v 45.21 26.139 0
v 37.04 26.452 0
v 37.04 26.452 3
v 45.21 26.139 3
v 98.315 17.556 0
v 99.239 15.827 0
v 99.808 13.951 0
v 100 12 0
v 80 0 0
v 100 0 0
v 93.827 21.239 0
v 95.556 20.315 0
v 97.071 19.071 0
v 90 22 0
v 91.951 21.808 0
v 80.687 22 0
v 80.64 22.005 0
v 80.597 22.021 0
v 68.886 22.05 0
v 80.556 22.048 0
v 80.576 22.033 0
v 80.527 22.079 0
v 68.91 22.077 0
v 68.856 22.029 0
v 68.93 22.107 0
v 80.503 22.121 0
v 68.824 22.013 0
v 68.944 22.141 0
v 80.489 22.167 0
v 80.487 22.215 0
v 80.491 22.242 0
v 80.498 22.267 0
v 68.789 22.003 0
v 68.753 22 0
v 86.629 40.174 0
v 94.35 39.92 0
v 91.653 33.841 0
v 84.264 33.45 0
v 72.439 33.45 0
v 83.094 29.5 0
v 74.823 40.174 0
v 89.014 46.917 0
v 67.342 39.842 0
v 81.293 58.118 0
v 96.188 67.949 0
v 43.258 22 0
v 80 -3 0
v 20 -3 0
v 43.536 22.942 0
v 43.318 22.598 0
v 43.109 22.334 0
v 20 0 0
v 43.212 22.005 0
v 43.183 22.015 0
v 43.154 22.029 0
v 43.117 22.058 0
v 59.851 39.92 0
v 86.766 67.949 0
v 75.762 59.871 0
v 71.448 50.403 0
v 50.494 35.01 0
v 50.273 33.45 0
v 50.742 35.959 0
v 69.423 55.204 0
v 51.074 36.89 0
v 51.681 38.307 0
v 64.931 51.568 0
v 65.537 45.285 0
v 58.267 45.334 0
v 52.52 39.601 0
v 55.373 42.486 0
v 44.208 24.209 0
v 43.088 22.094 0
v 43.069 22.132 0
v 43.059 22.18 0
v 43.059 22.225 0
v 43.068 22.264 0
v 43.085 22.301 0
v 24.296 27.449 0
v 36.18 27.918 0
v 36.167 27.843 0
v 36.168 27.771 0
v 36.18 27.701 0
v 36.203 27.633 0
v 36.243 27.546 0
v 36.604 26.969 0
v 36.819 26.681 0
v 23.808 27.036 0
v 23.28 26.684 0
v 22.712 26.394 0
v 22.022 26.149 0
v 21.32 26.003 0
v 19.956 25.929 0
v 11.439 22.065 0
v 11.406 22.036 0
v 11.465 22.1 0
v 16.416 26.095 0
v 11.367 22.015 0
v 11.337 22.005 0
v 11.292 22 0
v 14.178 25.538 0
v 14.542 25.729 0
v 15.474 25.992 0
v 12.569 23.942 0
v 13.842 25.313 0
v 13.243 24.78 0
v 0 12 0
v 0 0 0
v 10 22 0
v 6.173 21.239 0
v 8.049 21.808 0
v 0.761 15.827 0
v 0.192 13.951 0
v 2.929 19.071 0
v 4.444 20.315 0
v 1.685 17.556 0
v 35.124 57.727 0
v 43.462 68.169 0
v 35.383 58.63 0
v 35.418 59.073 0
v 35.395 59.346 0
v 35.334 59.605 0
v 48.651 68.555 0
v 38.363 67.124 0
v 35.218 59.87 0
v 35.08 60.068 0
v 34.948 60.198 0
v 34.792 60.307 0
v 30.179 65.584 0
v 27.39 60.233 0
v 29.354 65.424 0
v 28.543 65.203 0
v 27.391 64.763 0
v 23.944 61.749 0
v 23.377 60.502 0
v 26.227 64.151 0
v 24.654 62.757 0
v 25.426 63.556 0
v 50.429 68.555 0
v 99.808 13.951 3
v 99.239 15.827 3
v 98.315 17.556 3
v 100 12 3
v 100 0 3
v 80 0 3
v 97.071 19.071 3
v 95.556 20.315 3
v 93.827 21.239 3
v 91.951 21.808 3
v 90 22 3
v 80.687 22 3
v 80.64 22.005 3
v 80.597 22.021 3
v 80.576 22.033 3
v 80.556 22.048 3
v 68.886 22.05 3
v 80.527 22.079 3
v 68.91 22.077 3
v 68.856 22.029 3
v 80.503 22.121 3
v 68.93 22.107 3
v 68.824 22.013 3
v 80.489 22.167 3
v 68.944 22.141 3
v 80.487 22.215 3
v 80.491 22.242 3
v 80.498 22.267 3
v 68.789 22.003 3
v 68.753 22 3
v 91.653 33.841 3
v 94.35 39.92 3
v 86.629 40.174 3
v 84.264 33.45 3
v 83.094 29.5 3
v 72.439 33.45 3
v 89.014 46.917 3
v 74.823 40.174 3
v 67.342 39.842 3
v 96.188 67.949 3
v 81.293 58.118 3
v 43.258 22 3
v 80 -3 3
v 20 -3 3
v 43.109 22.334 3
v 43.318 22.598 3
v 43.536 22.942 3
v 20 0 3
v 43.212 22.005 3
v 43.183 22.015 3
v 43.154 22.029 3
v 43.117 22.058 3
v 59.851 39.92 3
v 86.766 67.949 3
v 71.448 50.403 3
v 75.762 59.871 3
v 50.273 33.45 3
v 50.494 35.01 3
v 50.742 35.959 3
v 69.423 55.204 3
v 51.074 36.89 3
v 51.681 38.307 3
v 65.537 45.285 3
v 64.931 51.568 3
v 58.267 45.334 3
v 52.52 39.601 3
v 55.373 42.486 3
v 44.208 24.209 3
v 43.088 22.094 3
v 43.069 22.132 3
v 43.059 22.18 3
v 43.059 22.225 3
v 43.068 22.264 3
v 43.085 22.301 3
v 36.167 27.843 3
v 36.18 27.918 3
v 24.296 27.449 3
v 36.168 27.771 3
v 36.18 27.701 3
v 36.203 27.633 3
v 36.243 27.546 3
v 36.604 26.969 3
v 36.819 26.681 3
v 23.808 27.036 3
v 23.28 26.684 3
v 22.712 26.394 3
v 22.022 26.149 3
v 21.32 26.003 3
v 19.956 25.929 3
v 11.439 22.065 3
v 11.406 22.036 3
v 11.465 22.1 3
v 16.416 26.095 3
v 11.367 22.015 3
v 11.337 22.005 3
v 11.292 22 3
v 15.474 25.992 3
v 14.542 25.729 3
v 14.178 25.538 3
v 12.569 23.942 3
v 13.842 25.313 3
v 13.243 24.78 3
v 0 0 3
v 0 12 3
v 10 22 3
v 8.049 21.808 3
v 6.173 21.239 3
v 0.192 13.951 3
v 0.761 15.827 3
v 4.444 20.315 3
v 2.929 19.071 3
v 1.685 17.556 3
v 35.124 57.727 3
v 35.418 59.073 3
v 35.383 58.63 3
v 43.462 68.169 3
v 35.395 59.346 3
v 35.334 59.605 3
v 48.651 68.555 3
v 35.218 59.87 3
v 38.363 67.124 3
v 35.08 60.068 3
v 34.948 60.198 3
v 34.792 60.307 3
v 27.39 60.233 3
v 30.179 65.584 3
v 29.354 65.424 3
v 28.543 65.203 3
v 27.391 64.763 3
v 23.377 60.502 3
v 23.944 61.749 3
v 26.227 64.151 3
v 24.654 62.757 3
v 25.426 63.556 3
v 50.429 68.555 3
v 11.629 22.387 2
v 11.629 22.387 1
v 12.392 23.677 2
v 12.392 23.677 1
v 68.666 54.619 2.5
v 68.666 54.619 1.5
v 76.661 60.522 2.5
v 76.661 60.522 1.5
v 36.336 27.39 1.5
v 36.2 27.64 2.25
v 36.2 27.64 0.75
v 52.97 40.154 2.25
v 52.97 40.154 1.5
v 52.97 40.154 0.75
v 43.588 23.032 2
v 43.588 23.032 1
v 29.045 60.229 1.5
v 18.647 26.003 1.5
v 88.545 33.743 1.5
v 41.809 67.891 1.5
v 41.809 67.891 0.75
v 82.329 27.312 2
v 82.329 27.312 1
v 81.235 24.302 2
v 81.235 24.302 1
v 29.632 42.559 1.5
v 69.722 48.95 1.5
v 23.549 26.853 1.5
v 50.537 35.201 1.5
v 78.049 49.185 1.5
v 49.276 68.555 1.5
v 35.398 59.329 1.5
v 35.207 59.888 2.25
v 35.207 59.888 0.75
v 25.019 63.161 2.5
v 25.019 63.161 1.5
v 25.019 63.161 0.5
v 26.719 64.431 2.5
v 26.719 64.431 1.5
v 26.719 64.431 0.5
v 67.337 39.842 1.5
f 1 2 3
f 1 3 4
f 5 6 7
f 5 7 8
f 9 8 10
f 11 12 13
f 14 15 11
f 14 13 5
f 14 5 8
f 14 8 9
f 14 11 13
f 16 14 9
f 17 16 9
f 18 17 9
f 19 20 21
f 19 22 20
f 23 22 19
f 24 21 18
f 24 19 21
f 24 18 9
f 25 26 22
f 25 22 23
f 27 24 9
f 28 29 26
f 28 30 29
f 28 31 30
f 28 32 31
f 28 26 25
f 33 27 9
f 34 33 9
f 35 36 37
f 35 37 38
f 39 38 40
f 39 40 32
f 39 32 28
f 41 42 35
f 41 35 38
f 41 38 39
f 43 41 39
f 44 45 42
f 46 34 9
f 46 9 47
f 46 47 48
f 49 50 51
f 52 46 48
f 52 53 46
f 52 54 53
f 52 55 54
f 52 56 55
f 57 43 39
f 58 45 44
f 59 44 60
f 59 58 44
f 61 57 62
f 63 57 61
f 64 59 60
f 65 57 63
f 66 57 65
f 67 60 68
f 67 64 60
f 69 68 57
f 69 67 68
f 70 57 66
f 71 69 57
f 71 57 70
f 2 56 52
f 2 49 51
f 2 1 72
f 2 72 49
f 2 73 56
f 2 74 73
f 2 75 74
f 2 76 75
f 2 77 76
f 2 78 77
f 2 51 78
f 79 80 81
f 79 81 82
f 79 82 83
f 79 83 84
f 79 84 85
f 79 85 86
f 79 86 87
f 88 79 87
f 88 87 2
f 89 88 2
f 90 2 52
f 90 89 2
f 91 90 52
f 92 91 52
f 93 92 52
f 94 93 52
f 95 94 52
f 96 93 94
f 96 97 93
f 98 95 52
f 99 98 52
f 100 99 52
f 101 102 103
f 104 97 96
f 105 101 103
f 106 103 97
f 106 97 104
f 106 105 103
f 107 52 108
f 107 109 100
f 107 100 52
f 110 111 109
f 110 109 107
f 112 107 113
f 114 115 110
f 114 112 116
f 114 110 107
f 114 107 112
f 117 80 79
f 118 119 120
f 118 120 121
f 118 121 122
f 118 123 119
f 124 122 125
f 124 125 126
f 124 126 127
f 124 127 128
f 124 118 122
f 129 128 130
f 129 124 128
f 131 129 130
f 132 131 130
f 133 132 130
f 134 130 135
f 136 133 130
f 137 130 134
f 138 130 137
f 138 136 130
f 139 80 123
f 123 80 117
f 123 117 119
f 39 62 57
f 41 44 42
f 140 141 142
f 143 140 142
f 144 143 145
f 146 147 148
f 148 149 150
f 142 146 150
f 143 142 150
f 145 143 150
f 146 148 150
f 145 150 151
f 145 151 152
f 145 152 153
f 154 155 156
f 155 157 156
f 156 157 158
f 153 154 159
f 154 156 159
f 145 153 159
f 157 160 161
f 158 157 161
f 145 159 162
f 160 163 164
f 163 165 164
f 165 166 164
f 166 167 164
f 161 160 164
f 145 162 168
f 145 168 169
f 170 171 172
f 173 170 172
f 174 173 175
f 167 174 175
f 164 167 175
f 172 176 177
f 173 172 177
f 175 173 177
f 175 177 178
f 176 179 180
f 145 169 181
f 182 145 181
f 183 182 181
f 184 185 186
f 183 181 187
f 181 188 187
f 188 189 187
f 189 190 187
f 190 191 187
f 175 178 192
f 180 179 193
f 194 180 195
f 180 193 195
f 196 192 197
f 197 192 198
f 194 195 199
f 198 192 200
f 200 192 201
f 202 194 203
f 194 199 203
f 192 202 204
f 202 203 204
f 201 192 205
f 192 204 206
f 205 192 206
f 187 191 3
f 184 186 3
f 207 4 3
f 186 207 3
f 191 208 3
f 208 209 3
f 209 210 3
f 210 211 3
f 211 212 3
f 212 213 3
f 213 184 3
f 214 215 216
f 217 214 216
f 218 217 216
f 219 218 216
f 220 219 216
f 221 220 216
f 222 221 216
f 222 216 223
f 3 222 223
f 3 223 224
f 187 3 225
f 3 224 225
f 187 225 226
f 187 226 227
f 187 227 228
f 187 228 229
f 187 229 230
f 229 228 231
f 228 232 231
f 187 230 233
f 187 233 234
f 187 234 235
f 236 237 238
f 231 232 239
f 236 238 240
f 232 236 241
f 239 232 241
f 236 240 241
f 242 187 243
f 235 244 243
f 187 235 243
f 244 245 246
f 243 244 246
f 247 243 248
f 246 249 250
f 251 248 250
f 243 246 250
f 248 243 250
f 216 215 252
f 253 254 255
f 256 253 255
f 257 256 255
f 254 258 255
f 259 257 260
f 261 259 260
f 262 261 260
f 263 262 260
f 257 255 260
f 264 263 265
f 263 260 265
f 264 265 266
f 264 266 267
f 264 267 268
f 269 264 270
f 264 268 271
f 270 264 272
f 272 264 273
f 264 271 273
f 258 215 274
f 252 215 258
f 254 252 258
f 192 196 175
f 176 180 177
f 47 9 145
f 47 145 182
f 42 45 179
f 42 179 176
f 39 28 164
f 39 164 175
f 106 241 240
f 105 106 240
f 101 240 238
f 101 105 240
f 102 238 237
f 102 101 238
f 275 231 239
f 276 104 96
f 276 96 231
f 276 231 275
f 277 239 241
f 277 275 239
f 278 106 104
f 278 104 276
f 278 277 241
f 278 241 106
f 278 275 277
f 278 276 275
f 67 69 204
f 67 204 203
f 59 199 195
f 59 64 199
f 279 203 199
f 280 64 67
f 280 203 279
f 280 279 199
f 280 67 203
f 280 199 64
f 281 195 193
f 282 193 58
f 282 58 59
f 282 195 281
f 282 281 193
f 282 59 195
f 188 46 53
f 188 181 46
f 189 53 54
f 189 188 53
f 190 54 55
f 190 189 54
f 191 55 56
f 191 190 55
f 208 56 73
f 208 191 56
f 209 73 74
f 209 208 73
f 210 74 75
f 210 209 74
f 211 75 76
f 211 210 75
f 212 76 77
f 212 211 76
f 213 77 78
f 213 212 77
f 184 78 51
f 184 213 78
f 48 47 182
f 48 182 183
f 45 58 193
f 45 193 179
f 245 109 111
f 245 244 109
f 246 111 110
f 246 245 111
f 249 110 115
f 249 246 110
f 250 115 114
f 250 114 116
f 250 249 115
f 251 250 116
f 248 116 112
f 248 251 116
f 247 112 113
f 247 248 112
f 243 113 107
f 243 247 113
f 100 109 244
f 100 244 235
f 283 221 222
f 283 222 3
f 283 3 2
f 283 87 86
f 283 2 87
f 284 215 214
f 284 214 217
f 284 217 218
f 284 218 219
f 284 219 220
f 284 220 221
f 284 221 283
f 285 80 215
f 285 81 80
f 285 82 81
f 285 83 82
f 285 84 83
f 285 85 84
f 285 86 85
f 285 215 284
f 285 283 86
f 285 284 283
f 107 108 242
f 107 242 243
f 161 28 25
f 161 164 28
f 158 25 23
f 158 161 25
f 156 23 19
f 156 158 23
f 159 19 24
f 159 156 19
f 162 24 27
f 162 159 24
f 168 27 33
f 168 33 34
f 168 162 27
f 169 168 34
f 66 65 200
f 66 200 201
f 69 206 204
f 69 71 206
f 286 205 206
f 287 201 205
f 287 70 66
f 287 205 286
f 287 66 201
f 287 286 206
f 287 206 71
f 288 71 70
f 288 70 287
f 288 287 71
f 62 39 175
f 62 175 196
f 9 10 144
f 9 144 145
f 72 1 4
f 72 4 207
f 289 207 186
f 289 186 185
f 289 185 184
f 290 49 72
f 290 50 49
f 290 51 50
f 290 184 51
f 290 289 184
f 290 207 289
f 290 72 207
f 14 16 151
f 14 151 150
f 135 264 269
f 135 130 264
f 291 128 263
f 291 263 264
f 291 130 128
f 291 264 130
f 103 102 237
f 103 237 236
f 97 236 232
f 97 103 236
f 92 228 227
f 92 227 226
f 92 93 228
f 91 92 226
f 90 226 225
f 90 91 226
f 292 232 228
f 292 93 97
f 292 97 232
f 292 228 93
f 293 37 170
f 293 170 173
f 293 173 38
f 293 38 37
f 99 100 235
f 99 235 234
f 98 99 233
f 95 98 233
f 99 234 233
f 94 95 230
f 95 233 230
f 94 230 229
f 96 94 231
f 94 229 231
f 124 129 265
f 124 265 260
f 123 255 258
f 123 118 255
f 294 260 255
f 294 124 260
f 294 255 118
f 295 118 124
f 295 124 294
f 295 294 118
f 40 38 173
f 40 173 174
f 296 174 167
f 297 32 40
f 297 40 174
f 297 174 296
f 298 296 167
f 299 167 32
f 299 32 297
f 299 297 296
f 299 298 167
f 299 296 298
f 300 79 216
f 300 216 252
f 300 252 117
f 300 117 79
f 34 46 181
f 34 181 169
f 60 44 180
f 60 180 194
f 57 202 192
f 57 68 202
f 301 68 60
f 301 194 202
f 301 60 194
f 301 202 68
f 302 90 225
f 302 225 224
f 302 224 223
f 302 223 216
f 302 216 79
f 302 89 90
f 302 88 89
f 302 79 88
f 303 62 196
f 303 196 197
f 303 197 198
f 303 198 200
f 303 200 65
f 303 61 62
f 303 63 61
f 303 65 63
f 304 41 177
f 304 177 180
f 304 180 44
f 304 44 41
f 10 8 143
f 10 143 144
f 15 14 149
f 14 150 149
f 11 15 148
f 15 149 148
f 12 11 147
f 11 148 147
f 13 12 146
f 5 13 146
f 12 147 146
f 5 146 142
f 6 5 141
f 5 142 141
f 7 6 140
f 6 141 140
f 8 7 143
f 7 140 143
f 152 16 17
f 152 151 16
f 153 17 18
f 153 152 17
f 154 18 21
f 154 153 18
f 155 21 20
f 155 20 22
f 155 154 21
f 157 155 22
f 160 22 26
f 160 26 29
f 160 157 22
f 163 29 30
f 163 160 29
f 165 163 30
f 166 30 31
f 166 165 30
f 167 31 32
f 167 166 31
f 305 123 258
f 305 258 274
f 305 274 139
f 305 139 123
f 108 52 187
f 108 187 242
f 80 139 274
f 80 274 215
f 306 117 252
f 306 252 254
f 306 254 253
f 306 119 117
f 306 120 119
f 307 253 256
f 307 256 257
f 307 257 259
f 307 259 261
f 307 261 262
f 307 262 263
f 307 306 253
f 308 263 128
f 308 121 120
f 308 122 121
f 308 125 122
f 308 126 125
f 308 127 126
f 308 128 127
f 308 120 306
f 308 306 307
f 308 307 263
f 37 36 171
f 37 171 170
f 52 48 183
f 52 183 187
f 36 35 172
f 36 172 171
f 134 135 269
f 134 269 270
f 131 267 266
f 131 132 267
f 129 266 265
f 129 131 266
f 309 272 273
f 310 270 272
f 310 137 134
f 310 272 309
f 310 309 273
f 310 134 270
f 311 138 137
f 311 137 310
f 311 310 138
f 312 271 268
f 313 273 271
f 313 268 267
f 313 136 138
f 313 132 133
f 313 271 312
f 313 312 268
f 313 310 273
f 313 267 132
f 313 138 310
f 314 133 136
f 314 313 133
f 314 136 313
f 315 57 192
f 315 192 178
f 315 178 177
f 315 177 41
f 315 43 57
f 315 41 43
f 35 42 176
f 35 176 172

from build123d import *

# Parameters (mm, degrees)
BOSS_EXTRUDE1_DEPTH = 3
FILLET1_R           = 10
FILLET2_R           = 0.2


with BuildPart() as part:
    # Sketch1 → Boss-Extrude1 (new body)
    with BuildSketch(Plane.XY):
        with BuildLine():
            Line((42.749612228, 22.000000982), (68.900263663, 22.000000982))
            Line((68.900263663, 22.000000982), (72.438655427, 33.449873816))
            Line((72.438655427, 33.449873816), (50.272900931, 33.449873816))
            add(Edge.make_bspline(
                [(50.272900931, 33.449873816), (50.399701069, 35.232060422), (51.07430828, 36.890061462)],
                knots=[0, 0, 0, 1, 1, 1], degree=2))
            add(Edge.make_bspline(
                [(51.07430828, 36.890061462), (51.325314504, 37.69426052), (51.918420301, 38.823627057), (52.965393254, 40.197356727), (55.040325227, 42.226401797), (56.906069545, 43.842187727), (58.267427905, 45.334158413)],
                knots=[0, 0, 0, 0, 0.224443411, 0.338858347, 0.460950835, 1, 1, 1, 1], degree=3))
            add(Edge.make_bspline(
                [(58.267427905, 45.334158413), (60.384790067, 47.521422491), (63.79764632, 50.686490857), (68.693222774, 54.688016487), (72.643154035, 57.622122808), (76.561208747, 60.443533866), (81.264828304, 63.875801937), (84.634451747, 66.35024823), (86.766255114, 67.949482885)],
                knots=[0, 0, 0, 0, 0.250612348, 0.382931529, 0.520503025, 0.655730691, 0.780544062, 1, 1, 1, 1], degree=3))
            Line((86.766255114, 67.949482885), (96.1876781, 67.949482885))
            Line((96.1876781, 67.949482885), (89.014104997, 46.917426591))
            Line((89.014104997, 46.917426591), (86.629429469, 40.173876943))
            Line((86.629429469, 40.173876943), (94.350305153, 39.919772174))
            Line((94.350305153, 39.919772174), (91.652885294, 33.84080423))
            add(Edge.make_bspline(
                [(91.652885294, 33.84080423), (90.615751555, 33.849650126), (88.151293743, 33.72895626), (85.689091845, 33.579119519), (84.264300462, 33.449873816)],
                knots=[0, 0, 0, 0, 0.420206299, 1, 1, 1, 1], degree=3))
            add(Edge.make_bspline(
                [(84.264300462, 33.449873816), (83.751919692, 31.362918248), (82.707539096, 28.321707646), (81.319432158, 24.539092544), (80.676394779, 22.768772837), (80.402865584, 22.000000982)],
                knots=[0, 0, 0, 0, 0.502209297, 0.752080888, 0.943038063, 0.943038063, 0.943038063, 0.943038063], degree=3))
            Line((80.402865584, 22.000000982), (90.110220598, 22.000000982))
            Line((90.110220598, 22.000000982), (100, 22.000000982))
            Line((100, 22.000000982), (100, 0))
            Line((100, 0), (80, 0))
            Line((80, 0), (80, -3))
            Line((80, -3), (20, -3))
            Line((20, -3), (20, 0))
            Line((20, 0), (0, 0))
            Line((0, 0), (0, 22.000000982))
            Line((0, 22.000000982), (11.406772984, 22.000000982))
            add(Edge.make_bspline(
                [(11.406772984, 22.000000982), (11.481923411, 22.128324781), (11.803942066, 22.690265443), (12.606466874, 24.1299098), (13.601086209, 25.299520611), (14.541861056, 25.728998132)],
                knots=[0.174411648, 0.174411648, 0.174411648, 0.174411648, 0.24891213, 0.498932816, 1, 1, 1, 1], degree=3))
            add(Edge.make_bspline(
                [(14.541861056, 25.728998132), (15.88322935, 26.248262142), (18.633967114, 25.973494082), (21.403300538, 25.817845983), (22.712306717, 26.393579836)],
                knots=[0, 0, 0, 0, 0.501451854, 1, 1, 1, 1], degree=3))
            add(Edge.make_bspline(
                [(22.712306717, 26.393579836), (23.593849654, 26.784092389), (24.295574895, 27.449091955)],
                knots=[0, 0, 0, 1, 1, 1], degree=2))
            add(Edge.make_bspline(
                [(24.295574895, 27.449091955), (26.077870774, 32.484264955), (29.602867976, 42.60706621), (33.291895969, 52.671262962), (35.124347373, 57.726652549)],
                knots=[0, 0, 0, 0, 0.498322561, 1, 1, 1, 1], degree=3))
            add(Edge.make_bspline(
                [(35.124347373, 57.726652549), (35.307524439, 58.224190762), (35.602710566, 59.190766536), (35.150116794, 60.102162008), (34.792056521, 60.306793284)],
                knots=[0, 0, 0, 0, 0.581397084, 1, 1, 1, 1], degree=3))
            add(Edge.make_bspline(
                [(34.792056521, 60.306793284), (32.875335639, 60.340590356), (29.070344759, 60.156681953), (25.25736304, 60.26141883), (23.376888421, 60.502258491)],
                knots=[0, 0, 0, 0, 0.503014916, 1, 1, 1, 1], degree=3))
            add(Edge.make_bspline(
                [(23.376888421, 60.502258491), (23.608850931, 61.169430986), (24.093094541, 62.118385021), (25.011088656, 63.179121193), (25.784372398, 63.90164623), (26.73233409, 64.45535482), (28.159352101, 65.138054442), (29.35140978, 65.452871316), (30.179077631, 65.584353878)],
                knots=[0, 0, 0, 0, 0.237267367, 0.352023708, 0.469658656, 0.590380818, 0.718477308, 1, 1, 1, 1], degree=3))
            add(Edge.make_bspline(
                [(30.179077631, 65.584353878), (33.291343657, 65.982791022), (37.153111251, 66.834794979), (41.774910805, 67.914609184), (44.8548119, 68.397084929), (47.147903193, 68.544635368), (48.650539711, 68.555425028)],
                knots=[0, 0, 0, 0, 0.501477793, 0.632810111, 0.759518477, 1, 1, 1, 1], degree=3))
            add(Edge.make_bspline(
                [(48.650539711, 68.555425028), (48.859035932, 68.555425028), (49.451947061, 68.555425028), (50.044858189, 68.555425028), (50.429273097, 68.555425028)],
                knots=[0, 0, 0, 0, 0.351648352, 1, 1, 1, 1], degree=3))
            Line((50.429273097, 68.555425028), (36.179859492, 27.918208452))
            add(Edge.make_bspline(
                [(36.179859492, 27.918208452), (36.126676837, 27.718411957), (36.458316573, 27.208718898), (36.736006921, 26.725936024), (37.039906404, 26.452219398)],
                knots=[0, 0, 0, 0, 0.324502414, 1, 1, 1, 1], degree=3))
            Line((37.039906404, 26.452219398), (45.210352065, 26.139475067))
            add(Edge.make_bspline(
                [(45.210352065, 26.139475067), (44.6154125, 25.12625594), (44.070252391, 23.804016563), (43.219476455, 22.414888166), (42.889953696, 22.11142887), (42.749612228, 22.000000982)],
                knots=[0, 0, 0, 0, 0.504343167, 0.619768133, 0.696711259, 0.696711259, 0.696711259, 0.696711259], degree=3))
        make_face()
        with BuildLine():
            add(Edge.make_bspline(
                [(81.293229312, 58.117582963), (77.336378308, 55.190834109), (69.966290168, 49.375200463), (63.02434641, 43.054636478), (59.850696083, 39.919772174)],
                knots=[0, 0, 0, 0, 0.524587428, 1, 1, 1, 1], degree=3))
            add(Edge.make_bspline(
                [(59.850696083, 39.919772174), (62.347046703, 39.956138517), (67.338663055, 39.755607803), (72.337038175, 39.898913575), (74.823330954, 40.173876943)],
                knots=[0, 0, 0, 0, 0.499665743, 1, 1, 1, 1], degree=3))
            add(Edge.make_bspline(
                [(74.823330954, 40.173876943), (75.929225459, 43.166496772), (78.017470904, 49.172207513), (80.19988778, 55.144320848), (81.293229312, 58.117582963)],
                knots=[0, 0, 0, 0, 0.501754487, 1, 1, 1, 1], degree=3))
        make_face(mode=Mode.SUBTRACT)
    extrude(amount=BOSS_EXTRUDE1_DEPTH)

    # Fillet1
    fillet1_edges = [part.edges().sort_by_distance(p)[0] for p in [
        (100, 22.000000982, 1.5),
        (0, 22.000000982, 1.5),
    ]]
    fillet(fillet1_edges, radius=FILLET1_R)

    # Fillet2
    fillet2_edges = [part.edges().sort_by_distance(p)[0] for p in [
        (80.402865584, 22.000000982, 1.5),
        (42.749612228, 22.000000982, 1.5),
        (68.900263663, 22.000000982, 1.5),
        (11.406772984, 22.000000982, 1.5),
    ]]
    fillet(fillet2_edges, radius=FILLET2_R)


solid = part.part
